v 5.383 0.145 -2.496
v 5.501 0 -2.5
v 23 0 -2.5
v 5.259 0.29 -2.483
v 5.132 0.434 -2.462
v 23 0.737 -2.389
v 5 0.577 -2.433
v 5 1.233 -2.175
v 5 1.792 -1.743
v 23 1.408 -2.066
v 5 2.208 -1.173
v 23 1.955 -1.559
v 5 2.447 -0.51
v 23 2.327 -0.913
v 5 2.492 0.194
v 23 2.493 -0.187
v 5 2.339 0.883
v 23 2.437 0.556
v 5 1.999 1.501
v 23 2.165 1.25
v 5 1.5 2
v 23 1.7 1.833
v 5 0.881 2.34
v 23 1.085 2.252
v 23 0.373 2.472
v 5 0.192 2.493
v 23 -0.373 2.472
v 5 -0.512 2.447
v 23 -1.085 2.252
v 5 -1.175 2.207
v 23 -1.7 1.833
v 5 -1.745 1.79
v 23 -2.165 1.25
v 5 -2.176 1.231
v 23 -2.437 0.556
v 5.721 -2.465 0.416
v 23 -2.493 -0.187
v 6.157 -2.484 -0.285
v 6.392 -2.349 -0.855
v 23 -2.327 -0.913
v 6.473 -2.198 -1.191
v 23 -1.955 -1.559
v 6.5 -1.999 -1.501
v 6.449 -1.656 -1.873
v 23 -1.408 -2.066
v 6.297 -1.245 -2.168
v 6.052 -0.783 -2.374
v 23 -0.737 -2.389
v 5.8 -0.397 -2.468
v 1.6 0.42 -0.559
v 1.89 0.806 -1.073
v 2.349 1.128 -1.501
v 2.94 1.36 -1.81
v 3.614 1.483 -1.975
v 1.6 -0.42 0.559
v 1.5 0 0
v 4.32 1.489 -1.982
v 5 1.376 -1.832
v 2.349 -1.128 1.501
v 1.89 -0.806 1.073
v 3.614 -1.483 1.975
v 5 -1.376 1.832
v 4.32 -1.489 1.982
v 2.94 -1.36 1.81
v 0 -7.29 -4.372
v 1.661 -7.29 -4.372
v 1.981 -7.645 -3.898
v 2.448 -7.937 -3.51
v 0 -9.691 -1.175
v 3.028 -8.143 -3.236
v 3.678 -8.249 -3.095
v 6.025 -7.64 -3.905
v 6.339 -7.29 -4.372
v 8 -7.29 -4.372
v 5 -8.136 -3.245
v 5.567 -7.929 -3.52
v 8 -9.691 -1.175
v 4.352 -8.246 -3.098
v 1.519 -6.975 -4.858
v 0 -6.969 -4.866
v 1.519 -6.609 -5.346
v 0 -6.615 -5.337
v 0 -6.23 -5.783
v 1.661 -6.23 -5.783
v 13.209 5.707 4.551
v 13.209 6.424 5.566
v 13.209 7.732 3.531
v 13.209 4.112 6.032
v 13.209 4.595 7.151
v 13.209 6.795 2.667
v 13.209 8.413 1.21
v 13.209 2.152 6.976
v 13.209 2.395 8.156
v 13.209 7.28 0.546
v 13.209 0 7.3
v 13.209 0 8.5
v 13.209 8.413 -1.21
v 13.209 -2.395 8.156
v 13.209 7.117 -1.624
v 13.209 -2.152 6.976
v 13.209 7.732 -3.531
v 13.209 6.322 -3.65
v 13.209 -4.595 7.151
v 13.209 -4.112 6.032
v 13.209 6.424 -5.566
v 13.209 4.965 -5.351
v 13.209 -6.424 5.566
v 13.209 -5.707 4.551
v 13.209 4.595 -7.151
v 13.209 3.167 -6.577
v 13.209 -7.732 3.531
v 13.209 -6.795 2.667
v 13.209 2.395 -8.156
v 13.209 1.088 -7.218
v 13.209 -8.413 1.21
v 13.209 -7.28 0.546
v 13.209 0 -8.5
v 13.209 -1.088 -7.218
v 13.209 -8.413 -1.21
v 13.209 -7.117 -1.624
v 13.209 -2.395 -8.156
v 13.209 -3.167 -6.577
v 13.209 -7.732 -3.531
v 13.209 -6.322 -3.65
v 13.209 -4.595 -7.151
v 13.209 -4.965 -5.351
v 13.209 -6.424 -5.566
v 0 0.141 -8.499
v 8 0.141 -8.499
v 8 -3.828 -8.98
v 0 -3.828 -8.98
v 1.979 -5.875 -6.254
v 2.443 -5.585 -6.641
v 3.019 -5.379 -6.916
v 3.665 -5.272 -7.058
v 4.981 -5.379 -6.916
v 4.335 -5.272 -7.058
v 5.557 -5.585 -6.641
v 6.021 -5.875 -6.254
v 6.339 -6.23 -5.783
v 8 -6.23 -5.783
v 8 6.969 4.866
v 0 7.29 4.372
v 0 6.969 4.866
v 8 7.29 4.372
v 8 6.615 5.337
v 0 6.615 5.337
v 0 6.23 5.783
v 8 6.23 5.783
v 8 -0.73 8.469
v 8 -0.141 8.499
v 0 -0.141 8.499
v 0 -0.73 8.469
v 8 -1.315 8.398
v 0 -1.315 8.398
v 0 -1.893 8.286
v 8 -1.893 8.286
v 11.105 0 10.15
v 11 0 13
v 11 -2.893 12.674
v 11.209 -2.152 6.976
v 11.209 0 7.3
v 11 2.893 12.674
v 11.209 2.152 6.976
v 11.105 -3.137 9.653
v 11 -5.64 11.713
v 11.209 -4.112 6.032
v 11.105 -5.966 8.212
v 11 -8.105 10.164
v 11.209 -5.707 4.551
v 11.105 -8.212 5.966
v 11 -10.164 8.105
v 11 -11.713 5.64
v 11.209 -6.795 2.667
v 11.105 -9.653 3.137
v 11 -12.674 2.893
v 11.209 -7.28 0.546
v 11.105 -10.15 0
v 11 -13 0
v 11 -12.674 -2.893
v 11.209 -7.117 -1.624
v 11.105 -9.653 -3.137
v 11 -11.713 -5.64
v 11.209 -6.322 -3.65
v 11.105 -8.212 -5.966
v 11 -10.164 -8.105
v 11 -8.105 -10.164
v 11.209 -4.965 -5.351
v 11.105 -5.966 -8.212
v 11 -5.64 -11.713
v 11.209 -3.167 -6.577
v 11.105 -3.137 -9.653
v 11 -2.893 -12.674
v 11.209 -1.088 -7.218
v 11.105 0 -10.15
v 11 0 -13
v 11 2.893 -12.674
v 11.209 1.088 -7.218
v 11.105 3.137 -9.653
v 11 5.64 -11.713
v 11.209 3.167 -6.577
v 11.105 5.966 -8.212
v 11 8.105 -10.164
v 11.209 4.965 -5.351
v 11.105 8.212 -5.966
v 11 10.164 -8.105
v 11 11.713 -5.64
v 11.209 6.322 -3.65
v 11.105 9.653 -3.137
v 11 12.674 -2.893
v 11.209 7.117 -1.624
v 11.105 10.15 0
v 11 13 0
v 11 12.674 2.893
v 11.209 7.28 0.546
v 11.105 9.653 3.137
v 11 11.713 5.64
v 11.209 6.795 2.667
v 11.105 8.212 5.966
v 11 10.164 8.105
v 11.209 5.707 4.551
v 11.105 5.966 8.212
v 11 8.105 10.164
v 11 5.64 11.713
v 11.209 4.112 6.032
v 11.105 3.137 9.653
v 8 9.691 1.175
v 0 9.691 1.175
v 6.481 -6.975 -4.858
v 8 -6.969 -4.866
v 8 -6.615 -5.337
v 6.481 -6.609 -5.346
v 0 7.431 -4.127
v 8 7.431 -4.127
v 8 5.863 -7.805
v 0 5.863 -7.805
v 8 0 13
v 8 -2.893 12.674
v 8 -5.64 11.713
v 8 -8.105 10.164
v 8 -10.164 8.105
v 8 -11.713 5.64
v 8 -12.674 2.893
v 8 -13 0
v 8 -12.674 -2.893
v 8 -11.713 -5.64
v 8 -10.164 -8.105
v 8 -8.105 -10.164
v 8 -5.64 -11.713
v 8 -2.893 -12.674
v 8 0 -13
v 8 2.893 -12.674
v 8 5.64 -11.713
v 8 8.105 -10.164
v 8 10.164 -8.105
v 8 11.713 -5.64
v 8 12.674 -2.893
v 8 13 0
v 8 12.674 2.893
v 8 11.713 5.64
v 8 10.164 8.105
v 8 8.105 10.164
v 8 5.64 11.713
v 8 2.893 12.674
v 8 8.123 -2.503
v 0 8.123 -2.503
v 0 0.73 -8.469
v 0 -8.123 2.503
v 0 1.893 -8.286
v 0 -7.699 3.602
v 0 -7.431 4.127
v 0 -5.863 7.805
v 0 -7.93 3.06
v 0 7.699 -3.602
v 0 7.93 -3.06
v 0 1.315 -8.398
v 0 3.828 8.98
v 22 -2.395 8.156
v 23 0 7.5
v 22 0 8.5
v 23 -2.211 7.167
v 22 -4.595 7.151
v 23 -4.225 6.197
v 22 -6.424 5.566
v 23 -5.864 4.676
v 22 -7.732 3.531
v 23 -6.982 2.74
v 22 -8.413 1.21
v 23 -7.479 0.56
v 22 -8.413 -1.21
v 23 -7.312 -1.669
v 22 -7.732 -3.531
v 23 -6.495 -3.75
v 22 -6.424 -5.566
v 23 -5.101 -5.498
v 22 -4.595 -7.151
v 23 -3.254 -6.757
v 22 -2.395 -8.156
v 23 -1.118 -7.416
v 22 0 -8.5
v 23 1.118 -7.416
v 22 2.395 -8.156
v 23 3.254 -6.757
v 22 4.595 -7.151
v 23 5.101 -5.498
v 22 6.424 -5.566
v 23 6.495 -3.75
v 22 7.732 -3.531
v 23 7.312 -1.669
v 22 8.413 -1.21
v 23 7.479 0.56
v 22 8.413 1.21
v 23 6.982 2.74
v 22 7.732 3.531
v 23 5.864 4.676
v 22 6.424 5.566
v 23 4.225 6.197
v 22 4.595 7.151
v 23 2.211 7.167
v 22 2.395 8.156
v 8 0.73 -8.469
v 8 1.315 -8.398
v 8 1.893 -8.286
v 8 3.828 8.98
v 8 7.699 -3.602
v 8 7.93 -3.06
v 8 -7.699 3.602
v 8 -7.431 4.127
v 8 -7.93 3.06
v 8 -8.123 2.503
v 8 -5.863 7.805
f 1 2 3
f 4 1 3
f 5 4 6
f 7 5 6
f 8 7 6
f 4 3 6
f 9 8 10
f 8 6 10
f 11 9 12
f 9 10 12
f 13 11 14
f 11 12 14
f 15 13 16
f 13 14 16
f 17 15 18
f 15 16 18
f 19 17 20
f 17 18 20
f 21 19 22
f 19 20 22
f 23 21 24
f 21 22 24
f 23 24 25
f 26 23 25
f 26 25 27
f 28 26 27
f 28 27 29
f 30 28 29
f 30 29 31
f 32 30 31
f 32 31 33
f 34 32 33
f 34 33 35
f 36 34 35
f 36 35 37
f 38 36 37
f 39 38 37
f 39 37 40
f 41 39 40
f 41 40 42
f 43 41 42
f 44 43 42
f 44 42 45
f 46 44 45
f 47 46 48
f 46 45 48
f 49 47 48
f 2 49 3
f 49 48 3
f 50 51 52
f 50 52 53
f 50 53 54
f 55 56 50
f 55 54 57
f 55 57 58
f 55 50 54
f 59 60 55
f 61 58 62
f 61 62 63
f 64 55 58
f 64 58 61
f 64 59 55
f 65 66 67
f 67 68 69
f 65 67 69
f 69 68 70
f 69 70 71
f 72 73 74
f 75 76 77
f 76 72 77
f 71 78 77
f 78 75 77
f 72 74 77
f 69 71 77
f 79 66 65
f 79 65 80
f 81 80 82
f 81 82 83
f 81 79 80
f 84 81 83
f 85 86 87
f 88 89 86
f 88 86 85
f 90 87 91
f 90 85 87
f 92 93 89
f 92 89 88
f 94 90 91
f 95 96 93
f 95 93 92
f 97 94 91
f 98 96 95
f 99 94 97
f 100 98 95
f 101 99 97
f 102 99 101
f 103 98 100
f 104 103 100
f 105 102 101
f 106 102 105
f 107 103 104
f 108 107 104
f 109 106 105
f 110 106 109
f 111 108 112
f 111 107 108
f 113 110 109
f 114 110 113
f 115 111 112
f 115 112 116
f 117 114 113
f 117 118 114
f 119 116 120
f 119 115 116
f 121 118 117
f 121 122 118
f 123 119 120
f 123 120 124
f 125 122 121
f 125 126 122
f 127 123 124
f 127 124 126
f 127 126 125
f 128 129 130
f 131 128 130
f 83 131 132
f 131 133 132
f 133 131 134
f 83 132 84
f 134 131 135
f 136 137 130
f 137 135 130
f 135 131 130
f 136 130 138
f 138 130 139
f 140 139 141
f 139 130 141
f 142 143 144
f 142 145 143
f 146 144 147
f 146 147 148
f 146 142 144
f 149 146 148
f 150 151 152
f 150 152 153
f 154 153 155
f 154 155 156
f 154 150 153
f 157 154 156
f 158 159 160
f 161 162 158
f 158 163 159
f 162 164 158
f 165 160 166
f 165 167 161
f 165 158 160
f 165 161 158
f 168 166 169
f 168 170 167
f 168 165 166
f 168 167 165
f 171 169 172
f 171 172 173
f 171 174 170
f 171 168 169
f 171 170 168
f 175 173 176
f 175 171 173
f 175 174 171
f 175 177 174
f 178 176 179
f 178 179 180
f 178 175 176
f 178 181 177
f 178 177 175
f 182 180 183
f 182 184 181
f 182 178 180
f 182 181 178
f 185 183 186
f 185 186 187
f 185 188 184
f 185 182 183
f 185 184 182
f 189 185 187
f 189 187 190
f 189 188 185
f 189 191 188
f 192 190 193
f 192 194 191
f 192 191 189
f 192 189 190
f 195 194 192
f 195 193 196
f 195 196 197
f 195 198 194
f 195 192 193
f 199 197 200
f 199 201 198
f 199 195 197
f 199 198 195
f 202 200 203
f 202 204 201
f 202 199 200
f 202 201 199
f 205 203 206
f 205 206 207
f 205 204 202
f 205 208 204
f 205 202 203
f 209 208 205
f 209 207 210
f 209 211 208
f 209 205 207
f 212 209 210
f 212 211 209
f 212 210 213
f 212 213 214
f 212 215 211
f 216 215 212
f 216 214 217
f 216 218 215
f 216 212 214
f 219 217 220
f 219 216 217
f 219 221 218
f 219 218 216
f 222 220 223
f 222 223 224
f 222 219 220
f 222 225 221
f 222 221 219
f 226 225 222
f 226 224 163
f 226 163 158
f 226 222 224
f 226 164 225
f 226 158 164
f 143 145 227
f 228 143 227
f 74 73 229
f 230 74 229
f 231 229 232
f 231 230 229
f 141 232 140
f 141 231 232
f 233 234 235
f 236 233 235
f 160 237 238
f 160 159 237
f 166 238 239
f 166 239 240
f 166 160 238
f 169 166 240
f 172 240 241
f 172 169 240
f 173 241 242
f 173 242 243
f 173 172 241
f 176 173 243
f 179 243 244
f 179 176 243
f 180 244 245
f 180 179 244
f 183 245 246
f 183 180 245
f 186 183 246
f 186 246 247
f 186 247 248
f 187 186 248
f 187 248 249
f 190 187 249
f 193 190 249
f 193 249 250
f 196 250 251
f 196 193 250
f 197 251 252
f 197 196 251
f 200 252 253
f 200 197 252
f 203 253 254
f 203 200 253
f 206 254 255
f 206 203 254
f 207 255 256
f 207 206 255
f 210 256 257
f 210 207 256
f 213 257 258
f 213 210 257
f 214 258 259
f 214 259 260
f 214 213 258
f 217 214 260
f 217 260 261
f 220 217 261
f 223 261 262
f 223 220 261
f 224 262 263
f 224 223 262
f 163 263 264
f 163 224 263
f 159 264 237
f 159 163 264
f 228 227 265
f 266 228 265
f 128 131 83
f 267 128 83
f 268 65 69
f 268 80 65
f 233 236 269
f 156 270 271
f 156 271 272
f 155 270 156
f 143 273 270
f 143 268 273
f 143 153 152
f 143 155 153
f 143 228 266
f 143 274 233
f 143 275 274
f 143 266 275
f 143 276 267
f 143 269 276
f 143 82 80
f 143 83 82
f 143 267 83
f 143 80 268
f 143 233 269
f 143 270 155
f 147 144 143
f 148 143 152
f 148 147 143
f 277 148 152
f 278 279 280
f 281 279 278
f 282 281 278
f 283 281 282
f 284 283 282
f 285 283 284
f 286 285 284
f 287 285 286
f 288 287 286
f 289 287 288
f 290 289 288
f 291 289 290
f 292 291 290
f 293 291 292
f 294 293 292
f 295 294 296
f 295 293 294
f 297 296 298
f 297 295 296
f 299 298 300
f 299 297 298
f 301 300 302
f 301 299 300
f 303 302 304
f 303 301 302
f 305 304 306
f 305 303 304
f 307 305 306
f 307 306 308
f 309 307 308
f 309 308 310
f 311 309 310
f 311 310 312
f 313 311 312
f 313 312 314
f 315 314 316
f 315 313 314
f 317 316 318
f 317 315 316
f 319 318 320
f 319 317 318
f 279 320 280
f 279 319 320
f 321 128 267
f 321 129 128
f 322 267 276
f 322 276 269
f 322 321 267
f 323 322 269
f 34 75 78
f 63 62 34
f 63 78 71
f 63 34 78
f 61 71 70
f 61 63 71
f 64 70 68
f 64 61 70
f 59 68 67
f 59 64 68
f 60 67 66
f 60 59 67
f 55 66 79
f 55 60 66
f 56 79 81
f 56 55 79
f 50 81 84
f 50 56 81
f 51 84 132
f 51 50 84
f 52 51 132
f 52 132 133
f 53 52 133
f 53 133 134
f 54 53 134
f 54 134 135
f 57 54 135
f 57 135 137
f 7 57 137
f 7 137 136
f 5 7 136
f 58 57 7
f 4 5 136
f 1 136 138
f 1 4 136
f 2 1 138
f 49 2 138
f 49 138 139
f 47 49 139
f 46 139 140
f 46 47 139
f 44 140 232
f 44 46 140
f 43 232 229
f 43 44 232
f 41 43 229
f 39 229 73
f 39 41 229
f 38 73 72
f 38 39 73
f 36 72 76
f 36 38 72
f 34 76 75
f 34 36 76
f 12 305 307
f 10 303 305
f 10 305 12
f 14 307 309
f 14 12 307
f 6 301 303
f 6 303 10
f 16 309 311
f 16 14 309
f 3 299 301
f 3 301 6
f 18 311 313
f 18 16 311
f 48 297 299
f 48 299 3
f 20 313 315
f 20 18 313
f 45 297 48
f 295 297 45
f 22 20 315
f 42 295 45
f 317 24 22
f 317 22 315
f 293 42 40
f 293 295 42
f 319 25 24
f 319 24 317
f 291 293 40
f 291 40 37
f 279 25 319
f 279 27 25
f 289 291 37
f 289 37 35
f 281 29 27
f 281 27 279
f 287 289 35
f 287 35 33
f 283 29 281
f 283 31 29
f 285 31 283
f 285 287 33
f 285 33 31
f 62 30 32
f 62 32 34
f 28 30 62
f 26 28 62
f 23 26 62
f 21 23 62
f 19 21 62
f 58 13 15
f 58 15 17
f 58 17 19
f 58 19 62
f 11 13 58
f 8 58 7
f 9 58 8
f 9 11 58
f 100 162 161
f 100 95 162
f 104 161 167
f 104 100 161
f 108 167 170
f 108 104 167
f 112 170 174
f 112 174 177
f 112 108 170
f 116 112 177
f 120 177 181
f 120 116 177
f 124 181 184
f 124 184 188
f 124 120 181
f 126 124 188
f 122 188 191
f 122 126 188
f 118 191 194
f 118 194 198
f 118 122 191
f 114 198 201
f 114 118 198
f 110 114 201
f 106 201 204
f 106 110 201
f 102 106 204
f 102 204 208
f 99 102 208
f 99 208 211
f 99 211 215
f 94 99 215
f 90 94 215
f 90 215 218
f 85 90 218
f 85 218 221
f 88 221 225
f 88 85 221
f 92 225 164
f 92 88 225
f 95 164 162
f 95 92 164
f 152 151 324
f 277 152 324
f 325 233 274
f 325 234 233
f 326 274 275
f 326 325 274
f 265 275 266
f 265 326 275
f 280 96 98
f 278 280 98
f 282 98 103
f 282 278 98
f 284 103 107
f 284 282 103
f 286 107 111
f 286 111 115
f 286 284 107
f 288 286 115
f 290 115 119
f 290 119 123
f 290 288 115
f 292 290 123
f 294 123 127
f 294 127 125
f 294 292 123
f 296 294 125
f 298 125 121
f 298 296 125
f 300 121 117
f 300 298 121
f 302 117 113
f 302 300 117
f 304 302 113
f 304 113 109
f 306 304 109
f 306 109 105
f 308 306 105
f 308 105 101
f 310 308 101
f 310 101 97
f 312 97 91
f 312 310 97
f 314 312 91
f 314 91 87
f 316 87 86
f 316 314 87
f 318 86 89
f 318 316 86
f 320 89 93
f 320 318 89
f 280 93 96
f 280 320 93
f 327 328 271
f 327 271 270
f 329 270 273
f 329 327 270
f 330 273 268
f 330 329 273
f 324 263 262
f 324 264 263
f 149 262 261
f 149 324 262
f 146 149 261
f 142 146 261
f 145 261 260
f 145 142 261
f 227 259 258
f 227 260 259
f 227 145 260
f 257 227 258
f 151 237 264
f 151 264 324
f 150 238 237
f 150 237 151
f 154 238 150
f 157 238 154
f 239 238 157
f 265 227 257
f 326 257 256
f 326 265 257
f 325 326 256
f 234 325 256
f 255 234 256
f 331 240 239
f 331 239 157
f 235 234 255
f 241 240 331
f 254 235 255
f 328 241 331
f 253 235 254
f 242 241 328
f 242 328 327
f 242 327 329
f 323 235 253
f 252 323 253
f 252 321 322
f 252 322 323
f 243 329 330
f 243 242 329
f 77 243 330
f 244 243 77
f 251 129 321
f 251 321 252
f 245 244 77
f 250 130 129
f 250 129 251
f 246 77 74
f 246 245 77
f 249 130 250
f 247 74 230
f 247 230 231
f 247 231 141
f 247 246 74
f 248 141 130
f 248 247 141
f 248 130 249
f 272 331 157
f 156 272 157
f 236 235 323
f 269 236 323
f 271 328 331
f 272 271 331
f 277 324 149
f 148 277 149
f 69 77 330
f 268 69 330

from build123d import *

# Parameters (mm, degrees)
EXTRUDE_START            = -8
SKETCH_2_R               = 8.5
EXTRUDE_1_DEPTH          = 8
CHAMFER_1_SIZE           = 1
SKETCH_3_R               = 2.5
CUT_EXTRUDE_1_DEPTH      = 18
CUT_EXTRUDE_2_DEPTH      = 18
CUT_EXTRUDE_2_DEPTH_BACK = 8.454068
SKETCH_4_R               = 2.5


with BuildPart() as part:
    # Sketch 1 → 旋转1 (revolve)
    with BuildSketch(Plane.XY, mode=Mode.PRIVATE) as revolve_1_sk:
        Polygon((0, 0), (0, 8.5), (8, 8.5), (8, 13), (11, 13), (11.209265355, 7.3), (13.209265355, 7.3), (13.209265355, 8.5), (23, 8.5), (23, 0), align=None)
    revolve(revolve_1_sk.sketch.rotate(Axis((0, 0, 0), (1, 0, 0)), 90), axis=Axis((0, 0, 0), (1, 0, 0)))

    # 草图2 → 凸台-拉伸1 (add)
    # profile 1 of 7: a face of its own
    with BuildSketch(Plane.ZY.offset(EXTRUDE_START)):
        Polygon((-1.174764966, -9.690972033), (7.805245485, -5.86286232), (8.980010451, 3.828109713), (1.174764966, 9.690972033), (-7.805245485, 5.86286232), (-8.980010451, -3.828109713), align=None)
        Circle(SKETCH_2_R, mode=Mode.SUBTRACT)
    # profile 2 of 7: a face of its own
    with BuildSketch(Plane.ZY.offset(EXTRUDE_START)):
        with BuildLine():
            Line((-7.805245485, 5.86286232), (-8.286430908, 1.893426207))
            ThreePointArc((-8.286430908, 1.893426207), (-6.796266629, 5.104974035), (-4.12702026, 7.430861577))
            Line((-4.12702026, 7.430861577), (-7.805245485, 5.86286232))
        make_face()
    # profile 3 of 7: a face of its own
    with BuildSketch(Plane.ZY.offset(EXTRUDE_START)):
        with BuildLine():
            ThreePointArc((-2.503460259, 8.122972777), (1.022903886, 8.43822657), (4.371804767, 7.289535176))
            Line((4.371804767, 7.289535176), (1.174764966, 9.690972033))
            Line((1.174764966, 9.690972033), (-2.503460259, 8.122972777))
        make_face()
    # profile 4 of 7: a face of its own
    with BuildSketch(Plane.ZY.offset(EXTRUDE_START)):
        with BuildLine():
            ThreePointArc((8.5, 0), (8.499706252, -0.070665642), (8.498825028, -0.141326401))
            Line((8.498825028, -0.141326401), (8.980010451, 3.828109713))
            Line((8.980010451, 3.828109713), (5.78297065, 6.22954657))
            ThreePointArc((5.78297065, 6.22954657), (7.79118895, 3.398142837), (8.5, 0))
        make_face()
    # profile 5 of 7: a face of its own
    with BuildSketch(Plane.ZY.offset(EXTRUDE_START)):
        with BuildLine():
            Line((4.12702026, -7.430861577), (7.805245485, -5.86286232))
            Line((7.805245485, -5.86286232), (8.286430908, -1.893426207))
            ThreePointArc((8.286430908, -1.893426207), (6.796266629, -5.104974035), (4.12702026, -7.430861577))
        make_face()
    # profile 6 of 7: a face of its own
    with BuildSketch(Plane.ZY.offset(EXTRUDE_START)):
        with BuildLine():
            Line((-1.174764966, -9.690972033), (2.503460259, -8.122972777))
            ThreePointArc((2.503460259, -8.122972777), (-1.022903886, -8.43822657), (-4.371804767, -7.289535176))
            Line((-4.371804767, -7.289535176), (-1.174764966, -9.690972033))
        make_face()
    # profile 7 of 7: a face of its own
    with BuildSketch(Plane.ZY.offset(EXTRUDE_START)):
        with BuildLine():
            Line((-8.980010451, -3.828109713), (-5.78297065, -6.22954657))
            ThreePointArc((-5.78297065, -6.22954657), (-7.819170515, -3.333252534), (-8.498825028, 0.141326401))
            Line((-8.498825028, 0.141326401), (-8.980010451, -3.828109713))
        make_face()
    extrude(amount=EXTRUDE_1_DEPTH)

    # 倒角1
    chamfer_1_edges = [part.edges().sort_by_distance(p)[0] for p in [
        (23, 0, -8.5),
    ]]
    chamfer(chamfer_1_edges, length=CHAMFER_1_SIZE)

    # 草图3 → 切除-拉伸1 (cut)
    with BuildSketch(Plane(origin=(23, 0, 0), x_dir=(0, 0, -1), z_dir=(1, 0, 0))):
        Circle(SKETCH_3_R)
    extrude(amount=-CUT_EXTRUDE_1_DEPTH, mode=Mode.SUBTRACT)

    # 草图4 → 切除-拉伸2 (cut, two sides: drawn at the far end of the back side and taken through both)
    with BuildSketch(Plane(origin=(0, -6.759540873, -5.077387708), x_dir=(1, 0, 0), z_dir=(0, -0.7995607799259467, -0.6005851806398588)).offset(-CUT_EXTRUDE_2_DEPTH_BACK)):
        with Locations(Location((4, 0, 0), (0, 0, 66.421821522))):
            Circle(SKETCH_4_R)
    extrude(amount=CUT_EXTRUDE_2_DEPTH + CUT_EXTRUDE_2_DEPTH_BACK, mode=Mode.SUBTRACT)


solid = part.part
